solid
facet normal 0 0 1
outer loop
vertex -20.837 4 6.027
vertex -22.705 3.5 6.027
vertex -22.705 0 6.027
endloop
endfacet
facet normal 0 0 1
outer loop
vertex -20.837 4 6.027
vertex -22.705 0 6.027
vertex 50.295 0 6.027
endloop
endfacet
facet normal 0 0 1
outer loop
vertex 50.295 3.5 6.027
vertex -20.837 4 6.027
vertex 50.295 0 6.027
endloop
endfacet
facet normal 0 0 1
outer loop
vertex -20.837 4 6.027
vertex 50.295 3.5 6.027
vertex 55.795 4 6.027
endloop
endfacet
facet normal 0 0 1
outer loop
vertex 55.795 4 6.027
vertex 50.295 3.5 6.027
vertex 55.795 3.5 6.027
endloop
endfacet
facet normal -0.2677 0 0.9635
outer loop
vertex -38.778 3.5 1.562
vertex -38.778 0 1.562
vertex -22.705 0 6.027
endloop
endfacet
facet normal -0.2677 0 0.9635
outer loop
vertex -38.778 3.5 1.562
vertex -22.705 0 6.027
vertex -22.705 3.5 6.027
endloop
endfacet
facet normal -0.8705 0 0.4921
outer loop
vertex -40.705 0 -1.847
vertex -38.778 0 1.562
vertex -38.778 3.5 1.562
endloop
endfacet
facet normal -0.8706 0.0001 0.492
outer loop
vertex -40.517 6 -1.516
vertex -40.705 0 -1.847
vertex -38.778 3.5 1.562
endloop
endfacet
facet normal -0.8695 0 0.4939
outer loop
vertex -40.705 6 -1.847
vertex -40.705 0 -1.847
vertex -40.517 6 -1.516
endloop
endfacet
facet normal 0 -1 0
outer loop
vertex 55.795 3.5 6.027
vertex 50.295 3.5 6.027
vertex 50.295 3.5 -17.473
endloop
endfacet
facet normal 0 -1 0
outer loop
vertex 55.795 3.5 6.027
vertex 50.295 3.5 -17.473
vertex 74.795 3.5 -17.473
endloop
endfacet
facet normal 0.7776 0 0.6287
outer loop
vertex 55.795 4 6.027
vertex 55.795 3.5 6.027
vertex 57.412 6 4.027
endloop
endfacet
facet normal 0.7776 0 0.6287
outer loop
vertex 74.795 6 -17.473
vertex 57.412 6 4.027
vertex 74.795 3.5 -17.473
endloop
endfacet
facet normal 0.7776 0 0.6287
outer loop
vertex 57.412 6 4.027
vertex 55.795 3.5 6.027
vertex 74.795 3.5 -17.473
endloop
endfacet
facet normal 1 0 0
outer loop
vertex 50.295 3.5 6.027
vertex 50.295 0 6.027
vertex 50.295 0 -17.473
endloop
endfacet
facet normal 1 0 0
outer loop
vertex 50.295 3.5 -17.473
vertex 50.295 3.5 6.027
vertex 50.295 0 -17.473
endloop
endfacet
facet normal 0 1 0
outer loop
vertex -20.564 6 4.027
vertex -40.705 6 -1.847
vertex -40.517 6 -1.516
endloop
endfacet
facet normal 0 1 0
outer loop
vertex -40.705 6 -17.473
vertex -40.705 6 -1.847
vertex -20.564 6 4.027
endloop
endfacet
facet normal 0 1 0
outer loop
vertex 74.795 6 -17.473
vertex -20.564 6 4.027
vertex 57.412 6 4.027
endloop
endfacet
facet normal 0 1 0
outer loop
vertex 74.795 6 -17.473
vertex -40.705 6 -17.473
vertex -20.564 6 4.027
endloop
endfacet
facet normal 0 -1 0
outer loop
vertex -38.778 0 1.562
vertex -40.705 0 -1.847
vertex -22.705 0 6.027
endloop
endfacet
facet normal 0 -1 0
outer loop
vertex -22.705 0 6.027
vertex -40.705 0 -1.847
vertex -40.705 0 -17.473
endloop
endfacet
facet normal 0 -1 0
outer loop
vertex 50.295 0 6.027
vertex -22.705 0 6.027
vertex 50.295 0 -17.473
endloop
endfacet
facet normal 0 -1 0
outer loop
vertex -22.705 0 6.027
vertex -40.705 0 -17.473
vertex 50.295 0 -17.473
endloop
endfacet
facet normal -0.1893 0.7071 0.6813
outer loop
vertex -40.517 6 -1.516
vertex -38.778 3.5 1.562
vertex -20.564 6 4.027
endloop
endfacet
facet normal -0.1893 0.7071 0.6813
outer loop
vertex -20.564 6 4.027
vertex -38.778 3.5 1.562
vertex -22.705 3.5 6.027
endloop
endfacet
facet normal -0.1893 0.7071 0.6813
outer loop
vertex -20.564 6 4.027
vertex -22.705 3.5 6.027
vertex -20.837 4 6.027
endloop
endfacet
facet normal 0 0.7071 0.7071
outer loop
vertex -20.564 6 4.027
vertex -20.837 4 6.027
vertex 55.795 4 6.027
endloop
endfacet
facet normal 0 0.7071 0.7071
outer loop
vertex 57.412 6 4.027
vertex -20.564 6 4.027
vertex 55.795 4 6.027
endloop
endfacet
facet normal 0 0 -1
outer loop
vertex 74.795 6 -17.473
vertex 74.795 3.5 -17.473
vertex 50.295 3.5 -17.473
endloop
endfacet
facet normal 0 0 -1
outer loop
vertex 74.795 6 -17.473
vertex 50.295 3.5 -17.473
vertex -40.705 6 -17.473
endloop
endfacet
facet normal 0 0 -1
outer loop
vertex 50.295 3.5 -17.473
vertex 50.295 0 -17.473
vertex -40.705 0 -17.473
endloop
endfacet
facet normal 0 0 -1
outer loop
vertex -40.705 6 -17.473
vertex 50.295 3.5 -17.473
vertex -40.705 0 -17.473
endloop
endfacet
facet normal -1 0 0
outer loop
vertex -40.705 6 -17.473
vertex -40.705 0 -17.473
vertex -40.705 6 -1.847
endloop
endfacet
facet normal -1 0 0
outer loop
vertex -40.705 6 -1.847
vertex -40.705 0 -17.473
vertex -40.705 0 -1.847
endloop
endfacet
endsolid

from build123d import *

# Parameters (mm, degrees)
SKETCH1_W           = 91
SKETCH1_H           = 23.5
BOSS_EXTRUDE1_DEPTH = 3.5
BOSS_EXTRUDE2_DEPTH = 2.5
CHAMFER1_SIZE       = 5
CHAMFER1_SIZE2      = 18
CHAMFER2_SIZE       = 2
CHAMFER2_SIZE2      = 2.874083337
CHAMFER3_SIZE       = 2.5
CHAMFER4_SIZE       = 2


with BuildPart() as part:
    # Sketch1 → Boss-Extrude1 (new body)
    with BuildSketch(Plane(origin=(0, 0, 0), x_dir=(1, 0, 0), z_dir=(0, 1, 0))):
        with Locations((4.795180723, 5.722891566)):
            Rectangle(SKETCH1_W, SKETCH1_H)
    extrude(amount=BOSS_EXTRUDE1_DEPTH)

    # Sketch2 → Boss-Extrude2 (add)
    with BuildSketch(Plane(origin=(0, 3.5, 0), x_dir=(1, 0, 0), z_dir=(0, 1, 0))):
        Polygon((-40.704819277, 17.472891566), (-40.704819277, -6.027108434), (55.795180723, -6.027108434), (74.795180723, 17.472891566), align=None)
    extrude(amount=BOSS_EXTRUDE2_DEPTH)

    # Chamfer1
    chamfer1_edges = [part.edges().sort_by_distance(p)[0] for p in [
        (-40.704819277, 3, 6.027108434),
    ]]
    chamfer1_side = [part.faces().sort_by_distance(p)[0] for p in [
        (-40.704819277, 3, -5.722891566),
    ]]
    chamfer(chamfer1_edges, length=CHAMFER1_SIZE, length2=CHAMFER1_SIZE2, reference=chamfer1_side[0])

    # Chamfer2
    chamfer2_edges = [part.edges().sort_by_distance(p)[0] for p in [
        (-40.704819277, 3, 1.027108434),
    ]]
    chamfer2_side = [part.faces().sort_by_distance(p)[0] for p in [
        (-31.704819277, 3, 3.527108434),
    ]]
    chamfer(chamfer2_edges, length=CHAMFER2_SIZE, length2=CHAMFER2_SIZE2, reference=chamfer2_side[0])

    # Chamfer3
    chamfer3_edges = [part.edges().sort_by_distance(p)[0] for p in [
        (-30.741301367, 6, 3.794752298),
    ]]
    chamfer(chamfer3_edges, length=CHAMFER3_SIZE)

    # Chamfer4
    chamfer4_edges = [part.edges().sort_by_distance(p)[0] for p in [
        (21.215566146, 6, 6.027108434),
    ]]
    chamfer(chamfer4_edges, length=CHAMFER4_SIZE)


solid = part.part
